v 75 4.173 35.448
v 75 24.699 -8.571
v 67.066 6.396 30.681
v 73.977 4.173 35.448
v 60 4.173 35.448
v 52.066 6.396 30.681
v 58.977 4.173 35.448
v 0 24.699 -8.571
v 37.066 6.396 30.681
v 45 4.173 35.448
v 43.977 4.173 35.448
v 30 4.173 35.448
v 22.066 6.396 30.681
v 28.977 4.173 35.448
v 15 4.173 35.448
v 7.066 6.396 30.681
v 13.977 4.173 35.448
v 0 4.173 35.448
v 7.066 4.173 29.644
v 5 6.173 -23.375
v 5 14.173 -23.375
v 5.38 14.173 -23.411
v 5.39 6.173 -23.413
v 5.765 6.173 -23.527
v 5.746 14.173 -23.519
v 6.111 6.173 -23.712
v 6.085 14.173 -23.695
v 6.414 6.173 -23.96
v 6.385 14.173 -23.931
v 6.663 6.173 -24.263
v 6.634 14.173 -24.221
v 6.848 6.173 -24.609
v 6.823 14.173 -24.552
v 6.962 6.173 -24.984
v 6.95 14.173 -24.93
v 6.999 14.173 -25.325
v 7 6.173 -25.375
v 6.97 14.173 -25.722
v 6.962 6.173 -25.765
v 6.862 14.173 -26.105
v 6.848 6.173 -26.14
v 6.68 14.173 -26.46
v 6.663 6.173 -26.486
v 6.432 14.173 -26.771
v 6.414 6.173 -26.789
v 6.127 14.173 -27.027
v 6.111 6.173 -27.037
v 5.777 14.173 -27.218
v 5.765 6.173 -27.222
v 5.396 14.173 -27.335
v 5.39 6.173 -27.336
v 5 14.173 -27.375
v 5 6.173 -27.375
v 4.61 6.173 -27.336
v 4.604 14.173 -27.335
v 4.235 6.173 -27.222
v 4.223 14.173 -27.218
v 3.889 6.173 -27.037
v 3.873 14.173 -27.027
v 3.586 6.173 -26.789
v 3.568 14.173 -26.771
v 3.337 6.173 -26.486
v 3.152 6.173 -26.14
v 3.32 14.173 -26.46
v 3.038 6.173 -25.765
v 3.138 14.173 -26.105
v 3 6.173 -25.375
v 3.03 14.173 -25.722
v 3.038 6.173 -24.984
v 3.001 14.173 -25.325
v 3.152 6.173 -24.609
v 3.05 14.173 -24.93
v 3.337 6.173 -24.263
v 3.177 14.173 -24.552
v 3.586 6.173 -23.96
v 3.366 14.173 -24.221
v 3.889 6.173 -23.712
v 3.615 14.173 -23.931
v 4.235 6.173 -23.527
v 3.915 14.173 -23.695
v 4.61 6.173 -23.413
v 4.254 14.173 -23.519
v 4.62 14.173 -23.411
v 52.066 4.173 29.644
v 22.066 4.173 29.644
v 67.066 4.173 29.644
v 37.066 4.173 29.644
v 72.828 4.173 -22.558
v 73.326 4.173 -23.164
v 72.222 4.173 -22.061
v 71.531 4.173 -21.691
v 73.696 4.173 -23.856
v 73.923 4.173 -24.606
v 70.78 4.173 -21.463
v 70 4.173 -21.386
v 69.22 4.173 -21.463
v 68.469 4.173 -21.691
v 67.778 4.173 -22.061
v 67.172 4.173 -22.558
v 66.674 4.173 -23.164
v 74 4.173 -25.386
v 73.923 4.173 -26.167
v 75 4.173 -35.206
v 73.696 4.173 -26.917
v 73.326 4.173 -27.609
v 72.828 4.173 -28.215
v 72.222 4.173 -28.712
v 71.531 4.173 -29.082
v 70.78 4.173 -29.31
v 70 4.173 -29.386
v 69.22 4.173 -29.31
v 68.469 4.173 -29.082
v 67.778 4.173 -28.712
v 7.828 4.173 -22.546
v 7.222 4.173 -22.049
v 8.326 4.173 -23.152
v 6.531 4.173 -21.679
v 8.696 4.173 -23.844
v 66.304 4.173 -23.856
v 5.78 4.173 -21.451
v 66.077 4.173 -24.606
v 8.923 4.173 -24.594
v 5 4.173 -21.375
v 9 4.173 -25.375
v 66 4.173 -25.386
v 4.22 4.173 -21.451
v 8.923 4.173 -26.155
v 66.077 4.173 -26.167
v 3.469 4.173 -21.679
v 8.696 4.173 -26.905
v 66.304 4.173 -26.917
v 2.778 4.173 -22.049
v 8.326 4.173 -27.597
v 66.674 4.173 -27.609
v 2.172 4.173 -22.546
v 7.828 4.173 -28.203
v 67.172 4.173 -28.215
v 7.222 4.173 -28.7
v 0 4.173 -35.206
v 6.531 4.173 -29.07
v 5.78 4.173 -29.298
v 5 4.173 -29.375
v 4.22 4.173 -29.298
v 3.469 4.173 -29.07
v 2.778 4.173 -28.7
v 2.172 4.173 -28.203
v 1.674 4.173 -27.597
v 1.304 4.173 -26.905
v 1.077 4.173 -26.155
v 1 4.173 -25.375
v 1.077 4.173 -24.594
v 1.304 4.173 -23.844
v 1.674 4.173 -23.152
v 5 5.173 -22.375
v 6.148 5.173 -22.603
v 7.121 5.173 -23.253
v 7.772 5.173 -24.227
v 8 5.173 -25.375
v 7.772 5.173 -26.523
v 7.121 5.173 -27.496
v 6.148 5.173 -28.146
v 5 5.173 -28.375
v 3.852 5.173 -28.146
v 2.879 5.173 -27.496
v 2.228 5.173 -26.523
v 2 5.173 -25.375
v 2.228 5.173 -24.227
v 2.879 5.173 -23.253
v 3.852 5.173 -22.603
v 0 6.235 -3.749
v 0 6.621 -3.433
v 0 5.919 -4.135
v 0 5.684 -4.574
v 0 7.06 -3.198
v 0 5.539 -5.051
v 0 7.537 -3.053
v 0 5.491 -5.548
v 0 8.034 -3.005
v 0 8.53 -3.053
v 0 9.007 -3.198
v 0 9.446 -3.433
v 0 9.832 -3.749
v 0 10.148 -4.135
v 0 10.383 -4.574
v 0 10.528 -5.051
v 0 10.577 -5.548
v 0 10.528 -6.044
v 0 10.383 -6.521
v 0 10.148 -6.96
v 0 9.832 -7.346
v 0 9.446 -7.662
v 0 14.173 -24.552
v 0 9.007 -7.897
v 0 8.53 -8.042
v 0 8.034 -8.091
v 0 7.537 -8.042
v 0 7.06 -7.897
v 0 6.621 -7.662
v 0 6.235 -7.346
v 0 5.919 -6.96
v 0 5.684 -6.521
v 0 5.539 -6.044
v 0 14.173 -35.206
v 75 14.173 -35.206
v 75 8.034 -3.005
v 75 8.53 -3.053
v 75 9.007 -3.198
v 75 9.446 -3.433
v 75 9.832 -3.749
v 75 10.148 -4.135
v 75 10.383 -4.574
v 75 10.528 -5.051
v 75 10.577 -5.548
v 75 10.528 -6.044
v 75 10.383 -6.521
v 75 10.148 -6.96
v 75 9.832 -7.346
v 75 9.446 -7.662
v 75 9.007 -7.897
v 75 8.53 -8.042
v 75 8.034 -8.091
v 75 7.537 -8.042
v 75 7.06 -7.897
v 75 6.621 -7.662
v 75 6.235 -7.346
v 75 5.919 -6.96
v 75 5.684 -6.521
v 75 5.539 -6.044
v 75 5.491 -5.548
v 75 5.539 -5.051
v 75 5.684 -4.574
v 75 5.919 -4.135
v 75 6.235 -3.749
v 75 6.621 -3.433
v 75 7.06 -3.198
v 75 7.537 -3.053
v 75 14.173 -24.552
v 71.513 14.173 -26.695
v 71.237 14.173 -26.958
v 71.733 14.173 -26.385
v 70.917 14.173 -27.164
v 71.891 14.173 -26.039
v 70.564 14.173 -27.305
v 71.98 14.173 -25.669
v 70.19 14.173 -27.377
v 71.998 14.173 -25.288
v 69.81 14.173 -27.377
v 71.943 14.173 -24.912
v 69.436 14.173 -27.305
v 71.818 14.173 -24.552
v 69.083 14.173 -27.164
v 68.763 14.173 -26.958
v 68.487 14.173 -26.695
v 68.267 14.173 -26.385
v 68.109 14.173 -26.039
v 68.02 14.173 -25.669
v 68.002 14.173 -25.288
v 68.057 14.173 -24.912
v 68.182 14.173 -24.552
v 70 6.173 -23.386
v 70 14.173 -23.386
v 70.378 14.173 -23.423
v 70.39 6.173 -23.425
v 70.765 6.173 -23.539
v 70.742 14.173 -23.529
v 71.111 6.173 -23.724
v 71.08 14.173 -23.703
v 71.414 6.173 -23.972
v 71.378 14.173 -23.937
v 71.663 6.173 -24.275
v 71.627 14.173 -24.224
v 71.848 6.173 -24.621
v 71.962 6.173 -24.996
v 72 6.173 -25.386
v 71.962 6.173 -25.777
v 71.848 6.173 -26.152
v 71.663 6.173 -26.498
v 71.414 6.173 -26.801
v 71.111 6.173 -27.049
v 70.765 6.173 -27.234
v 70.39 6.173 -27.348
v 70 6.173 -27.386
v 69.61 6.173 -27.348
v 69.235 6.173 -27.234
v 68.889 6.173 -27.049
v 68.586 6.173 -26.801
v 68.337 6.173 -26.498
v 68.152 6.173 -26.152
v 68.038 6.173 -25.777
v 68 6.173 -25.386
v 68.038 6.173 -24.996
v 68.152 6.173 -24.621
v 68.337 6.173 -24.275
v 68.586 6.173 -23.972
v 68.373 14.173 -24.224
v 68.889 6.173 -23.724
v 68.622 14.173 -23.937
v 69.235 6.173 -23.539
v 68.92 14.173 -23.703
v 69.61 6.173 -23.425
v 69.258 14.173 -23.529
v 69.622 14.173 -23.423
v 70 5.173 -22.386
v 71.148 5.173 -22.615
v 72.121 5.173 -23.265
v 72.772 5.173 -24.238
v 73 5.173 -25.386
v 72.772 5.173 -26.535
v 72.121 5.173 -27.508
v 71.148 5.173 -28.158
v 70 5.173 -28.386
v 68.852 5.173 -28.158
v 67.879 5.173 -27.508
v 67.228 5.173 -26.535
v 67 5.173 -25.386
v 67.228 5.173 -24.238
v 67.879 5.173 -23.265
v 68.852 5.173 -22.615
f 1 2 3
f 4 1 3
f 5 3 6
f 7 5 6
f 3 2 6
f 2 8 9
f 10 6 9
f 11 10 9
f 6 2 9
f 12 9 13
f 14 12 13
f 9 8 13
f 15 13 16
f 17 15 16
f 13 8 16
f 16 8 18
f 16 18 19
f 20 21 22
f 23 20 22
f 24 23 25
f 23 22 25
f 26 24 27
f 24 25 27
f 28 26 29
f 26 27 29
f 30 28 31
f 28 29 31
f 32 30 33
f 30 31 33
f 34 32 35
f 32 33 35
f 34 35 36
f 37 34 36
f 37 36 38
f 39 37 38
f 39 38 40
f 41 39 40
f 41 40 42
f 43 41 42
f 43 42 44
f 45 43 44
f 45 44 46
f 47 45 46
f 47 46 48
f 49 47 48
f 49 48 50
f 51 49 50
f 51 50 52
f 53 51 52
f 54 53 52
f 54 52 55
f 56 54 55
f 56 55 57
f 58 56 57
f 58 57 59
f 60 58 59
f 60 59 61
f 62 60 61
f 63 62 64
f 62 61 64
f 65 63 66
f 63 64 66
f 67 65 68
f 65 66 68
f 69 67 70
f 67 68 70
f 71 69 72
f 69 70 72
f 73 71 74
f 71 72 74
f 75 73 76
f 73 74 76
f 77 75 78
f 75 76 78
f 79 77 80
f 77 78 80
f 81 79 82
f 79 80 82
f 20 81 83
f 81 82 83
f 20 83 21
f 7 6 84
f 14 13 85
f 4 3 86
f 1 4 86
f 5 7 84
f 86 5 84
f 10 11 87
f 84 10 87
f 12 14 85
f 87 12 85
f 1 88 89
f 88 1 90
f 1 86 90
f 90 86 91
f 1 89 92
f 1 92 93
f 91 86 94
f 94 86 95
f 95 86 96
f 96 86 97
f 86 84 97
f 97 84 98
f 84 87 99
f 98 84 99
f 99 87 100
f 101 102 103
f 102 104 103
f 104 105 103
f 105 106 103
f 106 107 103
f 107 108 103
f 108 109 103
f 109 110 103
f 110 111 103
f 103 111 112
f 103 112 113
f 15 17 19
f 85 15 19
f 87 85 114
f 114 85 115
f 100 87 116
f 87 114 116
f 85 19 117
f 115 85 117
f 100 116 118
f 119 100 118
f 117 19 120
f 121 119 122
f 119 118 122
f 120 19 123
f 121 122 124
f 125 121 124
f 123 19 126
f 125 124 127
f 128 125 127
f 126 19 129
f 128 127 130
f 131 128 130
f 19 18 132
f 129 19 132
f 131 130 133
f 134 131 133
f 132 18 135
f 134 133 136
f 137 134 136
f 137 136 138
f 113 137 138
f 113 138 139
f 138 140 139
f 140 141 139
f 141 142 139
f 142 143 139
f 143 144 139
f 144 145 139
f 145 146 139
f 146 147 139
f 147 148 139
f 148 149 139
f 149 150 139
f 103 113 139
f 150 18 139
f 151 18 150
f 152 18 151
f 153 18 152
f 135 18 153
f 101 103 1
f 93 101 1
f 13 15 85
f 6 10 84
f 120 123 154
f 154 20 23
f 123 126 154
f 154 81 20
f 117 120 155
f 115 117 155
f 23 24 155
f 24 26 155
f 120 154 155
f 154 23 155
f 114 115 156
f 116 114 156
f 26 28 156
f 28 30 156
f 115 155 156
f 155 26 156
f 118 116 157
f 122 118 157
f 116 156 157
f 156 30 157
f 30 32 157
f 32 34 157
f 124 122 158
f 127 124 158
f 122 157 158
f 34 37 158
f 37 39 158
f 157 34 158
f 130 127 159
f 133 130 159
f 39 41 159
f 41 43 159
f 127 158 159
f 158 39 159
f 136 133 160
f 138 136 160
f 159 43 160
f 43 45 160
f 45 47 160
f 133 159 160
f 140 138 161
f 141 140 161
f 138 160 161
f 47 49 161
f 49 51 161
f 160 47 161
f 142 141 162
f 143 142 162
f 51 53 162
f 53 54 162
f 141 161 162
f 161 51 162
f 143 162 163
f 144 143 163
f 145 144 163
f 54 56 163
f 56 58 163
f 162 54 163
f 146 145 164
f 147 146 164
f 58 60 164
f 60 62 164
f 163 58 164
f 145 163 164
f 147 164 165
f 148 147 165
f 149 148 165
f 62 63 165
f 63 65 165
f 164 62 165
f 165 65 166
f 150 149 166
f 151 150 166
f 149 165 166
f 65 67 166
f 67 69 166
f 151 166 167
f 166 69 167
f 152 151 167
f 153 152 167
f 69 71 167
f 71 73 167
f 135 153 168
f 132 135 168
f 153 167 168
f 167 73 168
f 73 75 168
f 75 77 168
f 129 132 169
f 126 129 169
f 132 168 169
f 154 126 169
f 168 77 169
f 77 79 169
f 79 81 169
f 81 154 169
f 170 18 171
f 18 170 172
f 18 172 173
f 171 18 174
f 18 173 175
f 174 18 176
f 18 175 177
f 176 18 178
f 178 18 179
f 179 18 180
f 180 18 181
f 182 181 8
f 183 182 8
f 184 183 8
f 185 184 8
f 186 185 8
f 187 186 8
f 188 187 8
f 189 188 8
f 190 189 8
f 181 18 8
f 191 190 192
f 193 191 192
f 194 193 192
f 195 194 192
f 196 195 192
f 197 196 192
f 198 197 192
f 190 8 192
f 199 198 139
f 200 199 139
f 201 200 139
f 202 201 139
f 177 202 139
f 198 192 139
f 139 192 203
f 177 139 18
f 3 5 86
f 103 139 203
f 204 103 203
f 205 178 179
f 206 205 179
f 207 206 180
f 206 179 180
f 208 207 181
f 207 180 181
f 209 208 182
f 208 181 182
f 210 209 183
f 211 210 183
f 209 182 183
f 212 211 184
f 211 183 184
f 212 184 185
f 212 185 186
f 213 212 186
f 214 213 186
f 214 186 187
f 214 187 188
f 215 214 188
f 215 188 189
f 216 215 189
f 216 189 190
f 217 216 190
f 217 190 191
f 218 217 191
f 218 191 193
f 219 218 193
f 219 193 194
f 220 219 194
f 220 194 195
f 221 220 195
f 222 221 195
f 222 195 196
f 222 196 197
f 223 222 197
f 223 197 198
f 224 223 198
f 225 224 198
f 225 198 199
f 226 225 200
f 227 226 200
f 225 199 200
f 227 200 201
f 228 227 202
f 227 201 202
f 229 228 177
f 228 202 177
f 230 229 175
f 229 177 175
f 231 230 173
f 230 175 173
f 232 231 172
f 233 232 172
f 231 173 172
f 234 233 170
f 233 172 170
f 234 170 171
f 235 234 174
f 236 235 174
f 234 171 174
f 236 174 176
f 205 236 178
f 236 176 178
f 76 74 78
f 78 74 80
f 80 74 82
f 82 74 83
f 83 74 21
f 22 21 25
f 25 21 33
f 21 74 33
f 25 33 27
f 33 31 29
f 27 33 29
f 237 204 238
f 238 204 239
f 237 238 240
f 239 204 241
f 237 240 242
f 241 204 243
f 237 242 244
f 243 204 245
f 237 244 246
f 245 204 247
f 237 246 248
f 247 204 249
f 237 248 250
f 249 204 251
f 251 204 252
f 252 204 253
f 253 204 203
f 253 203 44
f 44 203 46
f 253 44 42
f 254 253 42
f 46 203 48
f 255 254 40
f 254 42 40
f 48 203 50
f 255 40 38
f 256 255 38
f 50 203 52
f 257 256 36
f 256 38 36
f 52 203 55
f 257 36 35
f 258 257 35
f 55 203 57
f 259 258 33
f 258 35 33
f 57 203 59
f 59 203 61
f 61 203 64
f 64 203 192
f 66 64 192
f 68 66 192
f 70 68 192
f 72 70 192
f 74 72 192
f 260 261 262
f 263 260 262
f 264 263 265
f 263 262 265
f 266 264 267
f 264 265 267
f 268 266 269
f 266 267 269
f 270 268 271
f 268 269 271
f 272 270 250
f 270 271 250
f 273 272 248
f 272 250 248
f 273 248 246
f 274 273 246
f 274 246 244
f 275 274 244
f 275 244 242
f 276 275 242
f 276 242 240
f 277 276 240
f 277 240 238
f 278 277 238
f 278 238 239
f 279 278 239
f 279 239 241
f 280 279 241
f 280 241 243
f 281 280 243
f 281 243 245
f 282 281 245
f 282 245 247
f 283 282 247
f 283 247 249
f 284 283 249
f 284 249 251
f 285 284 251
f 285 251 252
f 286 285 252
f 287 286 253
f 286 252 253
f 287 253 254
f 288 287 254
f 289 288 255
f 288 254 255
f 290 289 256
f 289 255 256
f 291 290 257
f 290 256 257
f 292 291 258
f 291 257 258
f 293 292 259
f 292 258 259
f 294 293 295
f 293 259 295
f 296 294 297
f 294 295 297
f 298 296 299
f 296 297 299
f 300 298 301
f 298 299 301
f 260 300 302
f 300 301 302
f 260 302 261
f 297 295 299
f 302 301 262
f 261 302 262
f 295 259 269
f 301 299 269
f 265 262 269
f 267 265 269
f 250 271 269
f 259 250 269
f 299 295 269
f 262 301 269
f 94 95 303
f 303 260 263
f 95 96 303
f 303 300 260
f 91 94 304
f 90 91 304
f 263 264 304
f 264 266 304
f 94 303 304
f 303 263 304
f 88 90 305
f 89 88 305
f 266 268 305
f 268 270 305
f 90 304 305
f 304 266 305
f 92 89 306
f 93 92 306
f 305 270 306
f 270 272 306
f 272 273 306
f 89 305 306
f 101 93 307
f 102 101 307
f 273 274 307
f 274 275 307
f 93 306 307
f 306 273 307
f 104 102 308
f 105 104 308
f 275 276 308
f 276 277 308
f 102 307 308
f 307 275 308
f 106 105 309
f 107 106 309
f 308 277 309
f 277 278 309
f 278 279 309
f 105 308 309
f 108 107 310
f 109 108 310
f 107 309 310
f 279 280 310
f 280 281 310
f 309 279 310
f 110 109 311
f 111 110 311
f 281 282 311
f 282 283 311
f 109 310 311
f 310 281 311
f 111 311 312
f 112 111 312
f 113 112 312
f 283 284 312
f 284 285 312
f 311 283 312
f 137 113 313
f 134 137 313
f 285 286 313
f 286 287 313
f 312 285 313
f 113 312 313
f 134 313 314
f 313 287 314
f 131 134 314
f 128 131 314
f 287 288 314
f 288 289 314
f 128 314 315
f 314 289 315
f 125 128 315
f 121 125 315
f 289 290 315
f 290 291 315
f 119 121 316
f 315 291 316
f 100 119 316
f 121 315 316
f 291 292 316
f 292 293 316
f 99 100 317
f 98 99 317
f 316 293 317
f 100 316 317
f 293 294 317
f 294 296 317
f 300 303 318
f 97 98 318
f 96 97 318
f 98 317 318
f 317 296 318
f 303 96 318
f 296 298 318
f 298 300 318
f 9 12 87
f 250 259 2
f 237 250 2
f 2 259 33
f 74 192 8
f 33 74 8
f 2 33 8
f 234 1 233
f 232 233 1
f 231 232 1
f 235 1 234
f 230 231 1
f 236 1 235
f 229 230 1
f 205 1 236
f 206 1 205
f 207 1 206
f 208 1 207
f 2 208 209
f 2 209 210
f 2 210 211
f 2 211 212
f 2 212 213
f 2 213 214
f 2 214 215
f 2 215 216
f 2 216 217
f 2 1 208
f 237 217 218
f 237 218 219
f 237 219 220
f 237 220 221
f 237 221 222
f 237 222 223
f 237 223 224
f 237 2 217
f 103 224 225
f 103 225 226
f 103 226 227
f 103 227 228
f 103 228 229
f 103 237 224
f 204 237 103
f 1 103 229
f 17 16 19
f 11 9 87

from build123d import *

# Parameters (mm, degrees)
BOSS_EXTRUDE1_DEPTH = 75
SKETCH2_R           = 2
CUT_EXTRUDE1_DEPTH  = 10
CUT_EXTRUDE2_DEPTH  = 10
SKETCH3_R           = 2.543008444
CUT_EXTRUDE3_DEPTH  = 100
CHAMFER1_SIZE       = 2


with BuildPart() as part:
    # Sketch1 → Boss-Extrude1 (new body)
    with BuildSketch(Plane(origin=(0, 0, 0), x_dir=(0, 0, -1), z_dir=(1, 0, 0))):
        Polygon((-35.447605249, 4.173188871), (35.206481481, 4.173188871), (35.206481481, 14.173188871), (24.552394751, 14.173188871), (8.571096195, 24.699446456), align=None)
    extrude(amount=BOSS_EXTRUDE1_DEPTH)

    # Sketch2 → Cut-Extrude1 (cut)
    with BuildSketch(Plane(origin=(0, 14.173188871, 0), x_dir=(1, 0, 0), z_dir=(0, 1, 0))):
        with Locations(Location((5, 25.374559272, 0), (0, 0, 270))):
            Circle(SKETCH2_R)
        with Locations(Location((69.999998904, 25.386498054, 0), (0, 0, 270))):
            Circle(SKETCH2_R)
    extrude(amount=-CUT_EXTRUDE1_DEPTH, mode=Mode.SUBTRACT)

    # Sketch4 → Cut-Extrude2 (cut)
    with BuildSketch(Plane(origin=(0, 17.005051997, 7.929585973), x_dir=(1, 0, 0), z_dir=(0, 0.9063077870366527, 0.42261826174069383))):
        Polygon((0, -30.362774842), (7.065850082, -25.103103439), (13.976560291, -30.362774842), align=None)
        Polygon((22.065850082, -25.103103439), (28.976560291, -30.362774842), (15, -30.362774842), align=None)
        Polygon((37.065850082, -25.103103439), (43.976560291, -30.362774842), (30, -30.362774842), align=None)
        Polygon((52.065850082, -25.103103439), (58.976560291, -30.362774842), (45, -30.362774842), align=None)
        Polygon((67.065850082, -25.103103439), (73.976560291, -30.362774842), (60, -30.362774842), align=None)
    extrude(amount=-CUT_EXTRUDE2_DEPTH, mode=Mode.SUBTRACT)

    # Sketch3 → Cut-Extrude3 (cut)
    with BuildSketch(Plane.ZY):
        with Locations((-5.547587106, 8.033515635)):
            Circle(SKETCH3_R)
    extrude(amount=-CUT_EXTRUDE3_DEPTH, mode=Mode.SUBTRACT)

    # Chamfer1
    chamfer1_edges = [part.edges().sort_by_distance(p)[0] for p in [
        (5, 4.173188871, -27.374559272),
        (69.999998904, 4.173188871, -27.386498054),
    ]]
    chamfer(chamfer1_edges, length=CHAMFER1_SIZE)


solid = part.part
